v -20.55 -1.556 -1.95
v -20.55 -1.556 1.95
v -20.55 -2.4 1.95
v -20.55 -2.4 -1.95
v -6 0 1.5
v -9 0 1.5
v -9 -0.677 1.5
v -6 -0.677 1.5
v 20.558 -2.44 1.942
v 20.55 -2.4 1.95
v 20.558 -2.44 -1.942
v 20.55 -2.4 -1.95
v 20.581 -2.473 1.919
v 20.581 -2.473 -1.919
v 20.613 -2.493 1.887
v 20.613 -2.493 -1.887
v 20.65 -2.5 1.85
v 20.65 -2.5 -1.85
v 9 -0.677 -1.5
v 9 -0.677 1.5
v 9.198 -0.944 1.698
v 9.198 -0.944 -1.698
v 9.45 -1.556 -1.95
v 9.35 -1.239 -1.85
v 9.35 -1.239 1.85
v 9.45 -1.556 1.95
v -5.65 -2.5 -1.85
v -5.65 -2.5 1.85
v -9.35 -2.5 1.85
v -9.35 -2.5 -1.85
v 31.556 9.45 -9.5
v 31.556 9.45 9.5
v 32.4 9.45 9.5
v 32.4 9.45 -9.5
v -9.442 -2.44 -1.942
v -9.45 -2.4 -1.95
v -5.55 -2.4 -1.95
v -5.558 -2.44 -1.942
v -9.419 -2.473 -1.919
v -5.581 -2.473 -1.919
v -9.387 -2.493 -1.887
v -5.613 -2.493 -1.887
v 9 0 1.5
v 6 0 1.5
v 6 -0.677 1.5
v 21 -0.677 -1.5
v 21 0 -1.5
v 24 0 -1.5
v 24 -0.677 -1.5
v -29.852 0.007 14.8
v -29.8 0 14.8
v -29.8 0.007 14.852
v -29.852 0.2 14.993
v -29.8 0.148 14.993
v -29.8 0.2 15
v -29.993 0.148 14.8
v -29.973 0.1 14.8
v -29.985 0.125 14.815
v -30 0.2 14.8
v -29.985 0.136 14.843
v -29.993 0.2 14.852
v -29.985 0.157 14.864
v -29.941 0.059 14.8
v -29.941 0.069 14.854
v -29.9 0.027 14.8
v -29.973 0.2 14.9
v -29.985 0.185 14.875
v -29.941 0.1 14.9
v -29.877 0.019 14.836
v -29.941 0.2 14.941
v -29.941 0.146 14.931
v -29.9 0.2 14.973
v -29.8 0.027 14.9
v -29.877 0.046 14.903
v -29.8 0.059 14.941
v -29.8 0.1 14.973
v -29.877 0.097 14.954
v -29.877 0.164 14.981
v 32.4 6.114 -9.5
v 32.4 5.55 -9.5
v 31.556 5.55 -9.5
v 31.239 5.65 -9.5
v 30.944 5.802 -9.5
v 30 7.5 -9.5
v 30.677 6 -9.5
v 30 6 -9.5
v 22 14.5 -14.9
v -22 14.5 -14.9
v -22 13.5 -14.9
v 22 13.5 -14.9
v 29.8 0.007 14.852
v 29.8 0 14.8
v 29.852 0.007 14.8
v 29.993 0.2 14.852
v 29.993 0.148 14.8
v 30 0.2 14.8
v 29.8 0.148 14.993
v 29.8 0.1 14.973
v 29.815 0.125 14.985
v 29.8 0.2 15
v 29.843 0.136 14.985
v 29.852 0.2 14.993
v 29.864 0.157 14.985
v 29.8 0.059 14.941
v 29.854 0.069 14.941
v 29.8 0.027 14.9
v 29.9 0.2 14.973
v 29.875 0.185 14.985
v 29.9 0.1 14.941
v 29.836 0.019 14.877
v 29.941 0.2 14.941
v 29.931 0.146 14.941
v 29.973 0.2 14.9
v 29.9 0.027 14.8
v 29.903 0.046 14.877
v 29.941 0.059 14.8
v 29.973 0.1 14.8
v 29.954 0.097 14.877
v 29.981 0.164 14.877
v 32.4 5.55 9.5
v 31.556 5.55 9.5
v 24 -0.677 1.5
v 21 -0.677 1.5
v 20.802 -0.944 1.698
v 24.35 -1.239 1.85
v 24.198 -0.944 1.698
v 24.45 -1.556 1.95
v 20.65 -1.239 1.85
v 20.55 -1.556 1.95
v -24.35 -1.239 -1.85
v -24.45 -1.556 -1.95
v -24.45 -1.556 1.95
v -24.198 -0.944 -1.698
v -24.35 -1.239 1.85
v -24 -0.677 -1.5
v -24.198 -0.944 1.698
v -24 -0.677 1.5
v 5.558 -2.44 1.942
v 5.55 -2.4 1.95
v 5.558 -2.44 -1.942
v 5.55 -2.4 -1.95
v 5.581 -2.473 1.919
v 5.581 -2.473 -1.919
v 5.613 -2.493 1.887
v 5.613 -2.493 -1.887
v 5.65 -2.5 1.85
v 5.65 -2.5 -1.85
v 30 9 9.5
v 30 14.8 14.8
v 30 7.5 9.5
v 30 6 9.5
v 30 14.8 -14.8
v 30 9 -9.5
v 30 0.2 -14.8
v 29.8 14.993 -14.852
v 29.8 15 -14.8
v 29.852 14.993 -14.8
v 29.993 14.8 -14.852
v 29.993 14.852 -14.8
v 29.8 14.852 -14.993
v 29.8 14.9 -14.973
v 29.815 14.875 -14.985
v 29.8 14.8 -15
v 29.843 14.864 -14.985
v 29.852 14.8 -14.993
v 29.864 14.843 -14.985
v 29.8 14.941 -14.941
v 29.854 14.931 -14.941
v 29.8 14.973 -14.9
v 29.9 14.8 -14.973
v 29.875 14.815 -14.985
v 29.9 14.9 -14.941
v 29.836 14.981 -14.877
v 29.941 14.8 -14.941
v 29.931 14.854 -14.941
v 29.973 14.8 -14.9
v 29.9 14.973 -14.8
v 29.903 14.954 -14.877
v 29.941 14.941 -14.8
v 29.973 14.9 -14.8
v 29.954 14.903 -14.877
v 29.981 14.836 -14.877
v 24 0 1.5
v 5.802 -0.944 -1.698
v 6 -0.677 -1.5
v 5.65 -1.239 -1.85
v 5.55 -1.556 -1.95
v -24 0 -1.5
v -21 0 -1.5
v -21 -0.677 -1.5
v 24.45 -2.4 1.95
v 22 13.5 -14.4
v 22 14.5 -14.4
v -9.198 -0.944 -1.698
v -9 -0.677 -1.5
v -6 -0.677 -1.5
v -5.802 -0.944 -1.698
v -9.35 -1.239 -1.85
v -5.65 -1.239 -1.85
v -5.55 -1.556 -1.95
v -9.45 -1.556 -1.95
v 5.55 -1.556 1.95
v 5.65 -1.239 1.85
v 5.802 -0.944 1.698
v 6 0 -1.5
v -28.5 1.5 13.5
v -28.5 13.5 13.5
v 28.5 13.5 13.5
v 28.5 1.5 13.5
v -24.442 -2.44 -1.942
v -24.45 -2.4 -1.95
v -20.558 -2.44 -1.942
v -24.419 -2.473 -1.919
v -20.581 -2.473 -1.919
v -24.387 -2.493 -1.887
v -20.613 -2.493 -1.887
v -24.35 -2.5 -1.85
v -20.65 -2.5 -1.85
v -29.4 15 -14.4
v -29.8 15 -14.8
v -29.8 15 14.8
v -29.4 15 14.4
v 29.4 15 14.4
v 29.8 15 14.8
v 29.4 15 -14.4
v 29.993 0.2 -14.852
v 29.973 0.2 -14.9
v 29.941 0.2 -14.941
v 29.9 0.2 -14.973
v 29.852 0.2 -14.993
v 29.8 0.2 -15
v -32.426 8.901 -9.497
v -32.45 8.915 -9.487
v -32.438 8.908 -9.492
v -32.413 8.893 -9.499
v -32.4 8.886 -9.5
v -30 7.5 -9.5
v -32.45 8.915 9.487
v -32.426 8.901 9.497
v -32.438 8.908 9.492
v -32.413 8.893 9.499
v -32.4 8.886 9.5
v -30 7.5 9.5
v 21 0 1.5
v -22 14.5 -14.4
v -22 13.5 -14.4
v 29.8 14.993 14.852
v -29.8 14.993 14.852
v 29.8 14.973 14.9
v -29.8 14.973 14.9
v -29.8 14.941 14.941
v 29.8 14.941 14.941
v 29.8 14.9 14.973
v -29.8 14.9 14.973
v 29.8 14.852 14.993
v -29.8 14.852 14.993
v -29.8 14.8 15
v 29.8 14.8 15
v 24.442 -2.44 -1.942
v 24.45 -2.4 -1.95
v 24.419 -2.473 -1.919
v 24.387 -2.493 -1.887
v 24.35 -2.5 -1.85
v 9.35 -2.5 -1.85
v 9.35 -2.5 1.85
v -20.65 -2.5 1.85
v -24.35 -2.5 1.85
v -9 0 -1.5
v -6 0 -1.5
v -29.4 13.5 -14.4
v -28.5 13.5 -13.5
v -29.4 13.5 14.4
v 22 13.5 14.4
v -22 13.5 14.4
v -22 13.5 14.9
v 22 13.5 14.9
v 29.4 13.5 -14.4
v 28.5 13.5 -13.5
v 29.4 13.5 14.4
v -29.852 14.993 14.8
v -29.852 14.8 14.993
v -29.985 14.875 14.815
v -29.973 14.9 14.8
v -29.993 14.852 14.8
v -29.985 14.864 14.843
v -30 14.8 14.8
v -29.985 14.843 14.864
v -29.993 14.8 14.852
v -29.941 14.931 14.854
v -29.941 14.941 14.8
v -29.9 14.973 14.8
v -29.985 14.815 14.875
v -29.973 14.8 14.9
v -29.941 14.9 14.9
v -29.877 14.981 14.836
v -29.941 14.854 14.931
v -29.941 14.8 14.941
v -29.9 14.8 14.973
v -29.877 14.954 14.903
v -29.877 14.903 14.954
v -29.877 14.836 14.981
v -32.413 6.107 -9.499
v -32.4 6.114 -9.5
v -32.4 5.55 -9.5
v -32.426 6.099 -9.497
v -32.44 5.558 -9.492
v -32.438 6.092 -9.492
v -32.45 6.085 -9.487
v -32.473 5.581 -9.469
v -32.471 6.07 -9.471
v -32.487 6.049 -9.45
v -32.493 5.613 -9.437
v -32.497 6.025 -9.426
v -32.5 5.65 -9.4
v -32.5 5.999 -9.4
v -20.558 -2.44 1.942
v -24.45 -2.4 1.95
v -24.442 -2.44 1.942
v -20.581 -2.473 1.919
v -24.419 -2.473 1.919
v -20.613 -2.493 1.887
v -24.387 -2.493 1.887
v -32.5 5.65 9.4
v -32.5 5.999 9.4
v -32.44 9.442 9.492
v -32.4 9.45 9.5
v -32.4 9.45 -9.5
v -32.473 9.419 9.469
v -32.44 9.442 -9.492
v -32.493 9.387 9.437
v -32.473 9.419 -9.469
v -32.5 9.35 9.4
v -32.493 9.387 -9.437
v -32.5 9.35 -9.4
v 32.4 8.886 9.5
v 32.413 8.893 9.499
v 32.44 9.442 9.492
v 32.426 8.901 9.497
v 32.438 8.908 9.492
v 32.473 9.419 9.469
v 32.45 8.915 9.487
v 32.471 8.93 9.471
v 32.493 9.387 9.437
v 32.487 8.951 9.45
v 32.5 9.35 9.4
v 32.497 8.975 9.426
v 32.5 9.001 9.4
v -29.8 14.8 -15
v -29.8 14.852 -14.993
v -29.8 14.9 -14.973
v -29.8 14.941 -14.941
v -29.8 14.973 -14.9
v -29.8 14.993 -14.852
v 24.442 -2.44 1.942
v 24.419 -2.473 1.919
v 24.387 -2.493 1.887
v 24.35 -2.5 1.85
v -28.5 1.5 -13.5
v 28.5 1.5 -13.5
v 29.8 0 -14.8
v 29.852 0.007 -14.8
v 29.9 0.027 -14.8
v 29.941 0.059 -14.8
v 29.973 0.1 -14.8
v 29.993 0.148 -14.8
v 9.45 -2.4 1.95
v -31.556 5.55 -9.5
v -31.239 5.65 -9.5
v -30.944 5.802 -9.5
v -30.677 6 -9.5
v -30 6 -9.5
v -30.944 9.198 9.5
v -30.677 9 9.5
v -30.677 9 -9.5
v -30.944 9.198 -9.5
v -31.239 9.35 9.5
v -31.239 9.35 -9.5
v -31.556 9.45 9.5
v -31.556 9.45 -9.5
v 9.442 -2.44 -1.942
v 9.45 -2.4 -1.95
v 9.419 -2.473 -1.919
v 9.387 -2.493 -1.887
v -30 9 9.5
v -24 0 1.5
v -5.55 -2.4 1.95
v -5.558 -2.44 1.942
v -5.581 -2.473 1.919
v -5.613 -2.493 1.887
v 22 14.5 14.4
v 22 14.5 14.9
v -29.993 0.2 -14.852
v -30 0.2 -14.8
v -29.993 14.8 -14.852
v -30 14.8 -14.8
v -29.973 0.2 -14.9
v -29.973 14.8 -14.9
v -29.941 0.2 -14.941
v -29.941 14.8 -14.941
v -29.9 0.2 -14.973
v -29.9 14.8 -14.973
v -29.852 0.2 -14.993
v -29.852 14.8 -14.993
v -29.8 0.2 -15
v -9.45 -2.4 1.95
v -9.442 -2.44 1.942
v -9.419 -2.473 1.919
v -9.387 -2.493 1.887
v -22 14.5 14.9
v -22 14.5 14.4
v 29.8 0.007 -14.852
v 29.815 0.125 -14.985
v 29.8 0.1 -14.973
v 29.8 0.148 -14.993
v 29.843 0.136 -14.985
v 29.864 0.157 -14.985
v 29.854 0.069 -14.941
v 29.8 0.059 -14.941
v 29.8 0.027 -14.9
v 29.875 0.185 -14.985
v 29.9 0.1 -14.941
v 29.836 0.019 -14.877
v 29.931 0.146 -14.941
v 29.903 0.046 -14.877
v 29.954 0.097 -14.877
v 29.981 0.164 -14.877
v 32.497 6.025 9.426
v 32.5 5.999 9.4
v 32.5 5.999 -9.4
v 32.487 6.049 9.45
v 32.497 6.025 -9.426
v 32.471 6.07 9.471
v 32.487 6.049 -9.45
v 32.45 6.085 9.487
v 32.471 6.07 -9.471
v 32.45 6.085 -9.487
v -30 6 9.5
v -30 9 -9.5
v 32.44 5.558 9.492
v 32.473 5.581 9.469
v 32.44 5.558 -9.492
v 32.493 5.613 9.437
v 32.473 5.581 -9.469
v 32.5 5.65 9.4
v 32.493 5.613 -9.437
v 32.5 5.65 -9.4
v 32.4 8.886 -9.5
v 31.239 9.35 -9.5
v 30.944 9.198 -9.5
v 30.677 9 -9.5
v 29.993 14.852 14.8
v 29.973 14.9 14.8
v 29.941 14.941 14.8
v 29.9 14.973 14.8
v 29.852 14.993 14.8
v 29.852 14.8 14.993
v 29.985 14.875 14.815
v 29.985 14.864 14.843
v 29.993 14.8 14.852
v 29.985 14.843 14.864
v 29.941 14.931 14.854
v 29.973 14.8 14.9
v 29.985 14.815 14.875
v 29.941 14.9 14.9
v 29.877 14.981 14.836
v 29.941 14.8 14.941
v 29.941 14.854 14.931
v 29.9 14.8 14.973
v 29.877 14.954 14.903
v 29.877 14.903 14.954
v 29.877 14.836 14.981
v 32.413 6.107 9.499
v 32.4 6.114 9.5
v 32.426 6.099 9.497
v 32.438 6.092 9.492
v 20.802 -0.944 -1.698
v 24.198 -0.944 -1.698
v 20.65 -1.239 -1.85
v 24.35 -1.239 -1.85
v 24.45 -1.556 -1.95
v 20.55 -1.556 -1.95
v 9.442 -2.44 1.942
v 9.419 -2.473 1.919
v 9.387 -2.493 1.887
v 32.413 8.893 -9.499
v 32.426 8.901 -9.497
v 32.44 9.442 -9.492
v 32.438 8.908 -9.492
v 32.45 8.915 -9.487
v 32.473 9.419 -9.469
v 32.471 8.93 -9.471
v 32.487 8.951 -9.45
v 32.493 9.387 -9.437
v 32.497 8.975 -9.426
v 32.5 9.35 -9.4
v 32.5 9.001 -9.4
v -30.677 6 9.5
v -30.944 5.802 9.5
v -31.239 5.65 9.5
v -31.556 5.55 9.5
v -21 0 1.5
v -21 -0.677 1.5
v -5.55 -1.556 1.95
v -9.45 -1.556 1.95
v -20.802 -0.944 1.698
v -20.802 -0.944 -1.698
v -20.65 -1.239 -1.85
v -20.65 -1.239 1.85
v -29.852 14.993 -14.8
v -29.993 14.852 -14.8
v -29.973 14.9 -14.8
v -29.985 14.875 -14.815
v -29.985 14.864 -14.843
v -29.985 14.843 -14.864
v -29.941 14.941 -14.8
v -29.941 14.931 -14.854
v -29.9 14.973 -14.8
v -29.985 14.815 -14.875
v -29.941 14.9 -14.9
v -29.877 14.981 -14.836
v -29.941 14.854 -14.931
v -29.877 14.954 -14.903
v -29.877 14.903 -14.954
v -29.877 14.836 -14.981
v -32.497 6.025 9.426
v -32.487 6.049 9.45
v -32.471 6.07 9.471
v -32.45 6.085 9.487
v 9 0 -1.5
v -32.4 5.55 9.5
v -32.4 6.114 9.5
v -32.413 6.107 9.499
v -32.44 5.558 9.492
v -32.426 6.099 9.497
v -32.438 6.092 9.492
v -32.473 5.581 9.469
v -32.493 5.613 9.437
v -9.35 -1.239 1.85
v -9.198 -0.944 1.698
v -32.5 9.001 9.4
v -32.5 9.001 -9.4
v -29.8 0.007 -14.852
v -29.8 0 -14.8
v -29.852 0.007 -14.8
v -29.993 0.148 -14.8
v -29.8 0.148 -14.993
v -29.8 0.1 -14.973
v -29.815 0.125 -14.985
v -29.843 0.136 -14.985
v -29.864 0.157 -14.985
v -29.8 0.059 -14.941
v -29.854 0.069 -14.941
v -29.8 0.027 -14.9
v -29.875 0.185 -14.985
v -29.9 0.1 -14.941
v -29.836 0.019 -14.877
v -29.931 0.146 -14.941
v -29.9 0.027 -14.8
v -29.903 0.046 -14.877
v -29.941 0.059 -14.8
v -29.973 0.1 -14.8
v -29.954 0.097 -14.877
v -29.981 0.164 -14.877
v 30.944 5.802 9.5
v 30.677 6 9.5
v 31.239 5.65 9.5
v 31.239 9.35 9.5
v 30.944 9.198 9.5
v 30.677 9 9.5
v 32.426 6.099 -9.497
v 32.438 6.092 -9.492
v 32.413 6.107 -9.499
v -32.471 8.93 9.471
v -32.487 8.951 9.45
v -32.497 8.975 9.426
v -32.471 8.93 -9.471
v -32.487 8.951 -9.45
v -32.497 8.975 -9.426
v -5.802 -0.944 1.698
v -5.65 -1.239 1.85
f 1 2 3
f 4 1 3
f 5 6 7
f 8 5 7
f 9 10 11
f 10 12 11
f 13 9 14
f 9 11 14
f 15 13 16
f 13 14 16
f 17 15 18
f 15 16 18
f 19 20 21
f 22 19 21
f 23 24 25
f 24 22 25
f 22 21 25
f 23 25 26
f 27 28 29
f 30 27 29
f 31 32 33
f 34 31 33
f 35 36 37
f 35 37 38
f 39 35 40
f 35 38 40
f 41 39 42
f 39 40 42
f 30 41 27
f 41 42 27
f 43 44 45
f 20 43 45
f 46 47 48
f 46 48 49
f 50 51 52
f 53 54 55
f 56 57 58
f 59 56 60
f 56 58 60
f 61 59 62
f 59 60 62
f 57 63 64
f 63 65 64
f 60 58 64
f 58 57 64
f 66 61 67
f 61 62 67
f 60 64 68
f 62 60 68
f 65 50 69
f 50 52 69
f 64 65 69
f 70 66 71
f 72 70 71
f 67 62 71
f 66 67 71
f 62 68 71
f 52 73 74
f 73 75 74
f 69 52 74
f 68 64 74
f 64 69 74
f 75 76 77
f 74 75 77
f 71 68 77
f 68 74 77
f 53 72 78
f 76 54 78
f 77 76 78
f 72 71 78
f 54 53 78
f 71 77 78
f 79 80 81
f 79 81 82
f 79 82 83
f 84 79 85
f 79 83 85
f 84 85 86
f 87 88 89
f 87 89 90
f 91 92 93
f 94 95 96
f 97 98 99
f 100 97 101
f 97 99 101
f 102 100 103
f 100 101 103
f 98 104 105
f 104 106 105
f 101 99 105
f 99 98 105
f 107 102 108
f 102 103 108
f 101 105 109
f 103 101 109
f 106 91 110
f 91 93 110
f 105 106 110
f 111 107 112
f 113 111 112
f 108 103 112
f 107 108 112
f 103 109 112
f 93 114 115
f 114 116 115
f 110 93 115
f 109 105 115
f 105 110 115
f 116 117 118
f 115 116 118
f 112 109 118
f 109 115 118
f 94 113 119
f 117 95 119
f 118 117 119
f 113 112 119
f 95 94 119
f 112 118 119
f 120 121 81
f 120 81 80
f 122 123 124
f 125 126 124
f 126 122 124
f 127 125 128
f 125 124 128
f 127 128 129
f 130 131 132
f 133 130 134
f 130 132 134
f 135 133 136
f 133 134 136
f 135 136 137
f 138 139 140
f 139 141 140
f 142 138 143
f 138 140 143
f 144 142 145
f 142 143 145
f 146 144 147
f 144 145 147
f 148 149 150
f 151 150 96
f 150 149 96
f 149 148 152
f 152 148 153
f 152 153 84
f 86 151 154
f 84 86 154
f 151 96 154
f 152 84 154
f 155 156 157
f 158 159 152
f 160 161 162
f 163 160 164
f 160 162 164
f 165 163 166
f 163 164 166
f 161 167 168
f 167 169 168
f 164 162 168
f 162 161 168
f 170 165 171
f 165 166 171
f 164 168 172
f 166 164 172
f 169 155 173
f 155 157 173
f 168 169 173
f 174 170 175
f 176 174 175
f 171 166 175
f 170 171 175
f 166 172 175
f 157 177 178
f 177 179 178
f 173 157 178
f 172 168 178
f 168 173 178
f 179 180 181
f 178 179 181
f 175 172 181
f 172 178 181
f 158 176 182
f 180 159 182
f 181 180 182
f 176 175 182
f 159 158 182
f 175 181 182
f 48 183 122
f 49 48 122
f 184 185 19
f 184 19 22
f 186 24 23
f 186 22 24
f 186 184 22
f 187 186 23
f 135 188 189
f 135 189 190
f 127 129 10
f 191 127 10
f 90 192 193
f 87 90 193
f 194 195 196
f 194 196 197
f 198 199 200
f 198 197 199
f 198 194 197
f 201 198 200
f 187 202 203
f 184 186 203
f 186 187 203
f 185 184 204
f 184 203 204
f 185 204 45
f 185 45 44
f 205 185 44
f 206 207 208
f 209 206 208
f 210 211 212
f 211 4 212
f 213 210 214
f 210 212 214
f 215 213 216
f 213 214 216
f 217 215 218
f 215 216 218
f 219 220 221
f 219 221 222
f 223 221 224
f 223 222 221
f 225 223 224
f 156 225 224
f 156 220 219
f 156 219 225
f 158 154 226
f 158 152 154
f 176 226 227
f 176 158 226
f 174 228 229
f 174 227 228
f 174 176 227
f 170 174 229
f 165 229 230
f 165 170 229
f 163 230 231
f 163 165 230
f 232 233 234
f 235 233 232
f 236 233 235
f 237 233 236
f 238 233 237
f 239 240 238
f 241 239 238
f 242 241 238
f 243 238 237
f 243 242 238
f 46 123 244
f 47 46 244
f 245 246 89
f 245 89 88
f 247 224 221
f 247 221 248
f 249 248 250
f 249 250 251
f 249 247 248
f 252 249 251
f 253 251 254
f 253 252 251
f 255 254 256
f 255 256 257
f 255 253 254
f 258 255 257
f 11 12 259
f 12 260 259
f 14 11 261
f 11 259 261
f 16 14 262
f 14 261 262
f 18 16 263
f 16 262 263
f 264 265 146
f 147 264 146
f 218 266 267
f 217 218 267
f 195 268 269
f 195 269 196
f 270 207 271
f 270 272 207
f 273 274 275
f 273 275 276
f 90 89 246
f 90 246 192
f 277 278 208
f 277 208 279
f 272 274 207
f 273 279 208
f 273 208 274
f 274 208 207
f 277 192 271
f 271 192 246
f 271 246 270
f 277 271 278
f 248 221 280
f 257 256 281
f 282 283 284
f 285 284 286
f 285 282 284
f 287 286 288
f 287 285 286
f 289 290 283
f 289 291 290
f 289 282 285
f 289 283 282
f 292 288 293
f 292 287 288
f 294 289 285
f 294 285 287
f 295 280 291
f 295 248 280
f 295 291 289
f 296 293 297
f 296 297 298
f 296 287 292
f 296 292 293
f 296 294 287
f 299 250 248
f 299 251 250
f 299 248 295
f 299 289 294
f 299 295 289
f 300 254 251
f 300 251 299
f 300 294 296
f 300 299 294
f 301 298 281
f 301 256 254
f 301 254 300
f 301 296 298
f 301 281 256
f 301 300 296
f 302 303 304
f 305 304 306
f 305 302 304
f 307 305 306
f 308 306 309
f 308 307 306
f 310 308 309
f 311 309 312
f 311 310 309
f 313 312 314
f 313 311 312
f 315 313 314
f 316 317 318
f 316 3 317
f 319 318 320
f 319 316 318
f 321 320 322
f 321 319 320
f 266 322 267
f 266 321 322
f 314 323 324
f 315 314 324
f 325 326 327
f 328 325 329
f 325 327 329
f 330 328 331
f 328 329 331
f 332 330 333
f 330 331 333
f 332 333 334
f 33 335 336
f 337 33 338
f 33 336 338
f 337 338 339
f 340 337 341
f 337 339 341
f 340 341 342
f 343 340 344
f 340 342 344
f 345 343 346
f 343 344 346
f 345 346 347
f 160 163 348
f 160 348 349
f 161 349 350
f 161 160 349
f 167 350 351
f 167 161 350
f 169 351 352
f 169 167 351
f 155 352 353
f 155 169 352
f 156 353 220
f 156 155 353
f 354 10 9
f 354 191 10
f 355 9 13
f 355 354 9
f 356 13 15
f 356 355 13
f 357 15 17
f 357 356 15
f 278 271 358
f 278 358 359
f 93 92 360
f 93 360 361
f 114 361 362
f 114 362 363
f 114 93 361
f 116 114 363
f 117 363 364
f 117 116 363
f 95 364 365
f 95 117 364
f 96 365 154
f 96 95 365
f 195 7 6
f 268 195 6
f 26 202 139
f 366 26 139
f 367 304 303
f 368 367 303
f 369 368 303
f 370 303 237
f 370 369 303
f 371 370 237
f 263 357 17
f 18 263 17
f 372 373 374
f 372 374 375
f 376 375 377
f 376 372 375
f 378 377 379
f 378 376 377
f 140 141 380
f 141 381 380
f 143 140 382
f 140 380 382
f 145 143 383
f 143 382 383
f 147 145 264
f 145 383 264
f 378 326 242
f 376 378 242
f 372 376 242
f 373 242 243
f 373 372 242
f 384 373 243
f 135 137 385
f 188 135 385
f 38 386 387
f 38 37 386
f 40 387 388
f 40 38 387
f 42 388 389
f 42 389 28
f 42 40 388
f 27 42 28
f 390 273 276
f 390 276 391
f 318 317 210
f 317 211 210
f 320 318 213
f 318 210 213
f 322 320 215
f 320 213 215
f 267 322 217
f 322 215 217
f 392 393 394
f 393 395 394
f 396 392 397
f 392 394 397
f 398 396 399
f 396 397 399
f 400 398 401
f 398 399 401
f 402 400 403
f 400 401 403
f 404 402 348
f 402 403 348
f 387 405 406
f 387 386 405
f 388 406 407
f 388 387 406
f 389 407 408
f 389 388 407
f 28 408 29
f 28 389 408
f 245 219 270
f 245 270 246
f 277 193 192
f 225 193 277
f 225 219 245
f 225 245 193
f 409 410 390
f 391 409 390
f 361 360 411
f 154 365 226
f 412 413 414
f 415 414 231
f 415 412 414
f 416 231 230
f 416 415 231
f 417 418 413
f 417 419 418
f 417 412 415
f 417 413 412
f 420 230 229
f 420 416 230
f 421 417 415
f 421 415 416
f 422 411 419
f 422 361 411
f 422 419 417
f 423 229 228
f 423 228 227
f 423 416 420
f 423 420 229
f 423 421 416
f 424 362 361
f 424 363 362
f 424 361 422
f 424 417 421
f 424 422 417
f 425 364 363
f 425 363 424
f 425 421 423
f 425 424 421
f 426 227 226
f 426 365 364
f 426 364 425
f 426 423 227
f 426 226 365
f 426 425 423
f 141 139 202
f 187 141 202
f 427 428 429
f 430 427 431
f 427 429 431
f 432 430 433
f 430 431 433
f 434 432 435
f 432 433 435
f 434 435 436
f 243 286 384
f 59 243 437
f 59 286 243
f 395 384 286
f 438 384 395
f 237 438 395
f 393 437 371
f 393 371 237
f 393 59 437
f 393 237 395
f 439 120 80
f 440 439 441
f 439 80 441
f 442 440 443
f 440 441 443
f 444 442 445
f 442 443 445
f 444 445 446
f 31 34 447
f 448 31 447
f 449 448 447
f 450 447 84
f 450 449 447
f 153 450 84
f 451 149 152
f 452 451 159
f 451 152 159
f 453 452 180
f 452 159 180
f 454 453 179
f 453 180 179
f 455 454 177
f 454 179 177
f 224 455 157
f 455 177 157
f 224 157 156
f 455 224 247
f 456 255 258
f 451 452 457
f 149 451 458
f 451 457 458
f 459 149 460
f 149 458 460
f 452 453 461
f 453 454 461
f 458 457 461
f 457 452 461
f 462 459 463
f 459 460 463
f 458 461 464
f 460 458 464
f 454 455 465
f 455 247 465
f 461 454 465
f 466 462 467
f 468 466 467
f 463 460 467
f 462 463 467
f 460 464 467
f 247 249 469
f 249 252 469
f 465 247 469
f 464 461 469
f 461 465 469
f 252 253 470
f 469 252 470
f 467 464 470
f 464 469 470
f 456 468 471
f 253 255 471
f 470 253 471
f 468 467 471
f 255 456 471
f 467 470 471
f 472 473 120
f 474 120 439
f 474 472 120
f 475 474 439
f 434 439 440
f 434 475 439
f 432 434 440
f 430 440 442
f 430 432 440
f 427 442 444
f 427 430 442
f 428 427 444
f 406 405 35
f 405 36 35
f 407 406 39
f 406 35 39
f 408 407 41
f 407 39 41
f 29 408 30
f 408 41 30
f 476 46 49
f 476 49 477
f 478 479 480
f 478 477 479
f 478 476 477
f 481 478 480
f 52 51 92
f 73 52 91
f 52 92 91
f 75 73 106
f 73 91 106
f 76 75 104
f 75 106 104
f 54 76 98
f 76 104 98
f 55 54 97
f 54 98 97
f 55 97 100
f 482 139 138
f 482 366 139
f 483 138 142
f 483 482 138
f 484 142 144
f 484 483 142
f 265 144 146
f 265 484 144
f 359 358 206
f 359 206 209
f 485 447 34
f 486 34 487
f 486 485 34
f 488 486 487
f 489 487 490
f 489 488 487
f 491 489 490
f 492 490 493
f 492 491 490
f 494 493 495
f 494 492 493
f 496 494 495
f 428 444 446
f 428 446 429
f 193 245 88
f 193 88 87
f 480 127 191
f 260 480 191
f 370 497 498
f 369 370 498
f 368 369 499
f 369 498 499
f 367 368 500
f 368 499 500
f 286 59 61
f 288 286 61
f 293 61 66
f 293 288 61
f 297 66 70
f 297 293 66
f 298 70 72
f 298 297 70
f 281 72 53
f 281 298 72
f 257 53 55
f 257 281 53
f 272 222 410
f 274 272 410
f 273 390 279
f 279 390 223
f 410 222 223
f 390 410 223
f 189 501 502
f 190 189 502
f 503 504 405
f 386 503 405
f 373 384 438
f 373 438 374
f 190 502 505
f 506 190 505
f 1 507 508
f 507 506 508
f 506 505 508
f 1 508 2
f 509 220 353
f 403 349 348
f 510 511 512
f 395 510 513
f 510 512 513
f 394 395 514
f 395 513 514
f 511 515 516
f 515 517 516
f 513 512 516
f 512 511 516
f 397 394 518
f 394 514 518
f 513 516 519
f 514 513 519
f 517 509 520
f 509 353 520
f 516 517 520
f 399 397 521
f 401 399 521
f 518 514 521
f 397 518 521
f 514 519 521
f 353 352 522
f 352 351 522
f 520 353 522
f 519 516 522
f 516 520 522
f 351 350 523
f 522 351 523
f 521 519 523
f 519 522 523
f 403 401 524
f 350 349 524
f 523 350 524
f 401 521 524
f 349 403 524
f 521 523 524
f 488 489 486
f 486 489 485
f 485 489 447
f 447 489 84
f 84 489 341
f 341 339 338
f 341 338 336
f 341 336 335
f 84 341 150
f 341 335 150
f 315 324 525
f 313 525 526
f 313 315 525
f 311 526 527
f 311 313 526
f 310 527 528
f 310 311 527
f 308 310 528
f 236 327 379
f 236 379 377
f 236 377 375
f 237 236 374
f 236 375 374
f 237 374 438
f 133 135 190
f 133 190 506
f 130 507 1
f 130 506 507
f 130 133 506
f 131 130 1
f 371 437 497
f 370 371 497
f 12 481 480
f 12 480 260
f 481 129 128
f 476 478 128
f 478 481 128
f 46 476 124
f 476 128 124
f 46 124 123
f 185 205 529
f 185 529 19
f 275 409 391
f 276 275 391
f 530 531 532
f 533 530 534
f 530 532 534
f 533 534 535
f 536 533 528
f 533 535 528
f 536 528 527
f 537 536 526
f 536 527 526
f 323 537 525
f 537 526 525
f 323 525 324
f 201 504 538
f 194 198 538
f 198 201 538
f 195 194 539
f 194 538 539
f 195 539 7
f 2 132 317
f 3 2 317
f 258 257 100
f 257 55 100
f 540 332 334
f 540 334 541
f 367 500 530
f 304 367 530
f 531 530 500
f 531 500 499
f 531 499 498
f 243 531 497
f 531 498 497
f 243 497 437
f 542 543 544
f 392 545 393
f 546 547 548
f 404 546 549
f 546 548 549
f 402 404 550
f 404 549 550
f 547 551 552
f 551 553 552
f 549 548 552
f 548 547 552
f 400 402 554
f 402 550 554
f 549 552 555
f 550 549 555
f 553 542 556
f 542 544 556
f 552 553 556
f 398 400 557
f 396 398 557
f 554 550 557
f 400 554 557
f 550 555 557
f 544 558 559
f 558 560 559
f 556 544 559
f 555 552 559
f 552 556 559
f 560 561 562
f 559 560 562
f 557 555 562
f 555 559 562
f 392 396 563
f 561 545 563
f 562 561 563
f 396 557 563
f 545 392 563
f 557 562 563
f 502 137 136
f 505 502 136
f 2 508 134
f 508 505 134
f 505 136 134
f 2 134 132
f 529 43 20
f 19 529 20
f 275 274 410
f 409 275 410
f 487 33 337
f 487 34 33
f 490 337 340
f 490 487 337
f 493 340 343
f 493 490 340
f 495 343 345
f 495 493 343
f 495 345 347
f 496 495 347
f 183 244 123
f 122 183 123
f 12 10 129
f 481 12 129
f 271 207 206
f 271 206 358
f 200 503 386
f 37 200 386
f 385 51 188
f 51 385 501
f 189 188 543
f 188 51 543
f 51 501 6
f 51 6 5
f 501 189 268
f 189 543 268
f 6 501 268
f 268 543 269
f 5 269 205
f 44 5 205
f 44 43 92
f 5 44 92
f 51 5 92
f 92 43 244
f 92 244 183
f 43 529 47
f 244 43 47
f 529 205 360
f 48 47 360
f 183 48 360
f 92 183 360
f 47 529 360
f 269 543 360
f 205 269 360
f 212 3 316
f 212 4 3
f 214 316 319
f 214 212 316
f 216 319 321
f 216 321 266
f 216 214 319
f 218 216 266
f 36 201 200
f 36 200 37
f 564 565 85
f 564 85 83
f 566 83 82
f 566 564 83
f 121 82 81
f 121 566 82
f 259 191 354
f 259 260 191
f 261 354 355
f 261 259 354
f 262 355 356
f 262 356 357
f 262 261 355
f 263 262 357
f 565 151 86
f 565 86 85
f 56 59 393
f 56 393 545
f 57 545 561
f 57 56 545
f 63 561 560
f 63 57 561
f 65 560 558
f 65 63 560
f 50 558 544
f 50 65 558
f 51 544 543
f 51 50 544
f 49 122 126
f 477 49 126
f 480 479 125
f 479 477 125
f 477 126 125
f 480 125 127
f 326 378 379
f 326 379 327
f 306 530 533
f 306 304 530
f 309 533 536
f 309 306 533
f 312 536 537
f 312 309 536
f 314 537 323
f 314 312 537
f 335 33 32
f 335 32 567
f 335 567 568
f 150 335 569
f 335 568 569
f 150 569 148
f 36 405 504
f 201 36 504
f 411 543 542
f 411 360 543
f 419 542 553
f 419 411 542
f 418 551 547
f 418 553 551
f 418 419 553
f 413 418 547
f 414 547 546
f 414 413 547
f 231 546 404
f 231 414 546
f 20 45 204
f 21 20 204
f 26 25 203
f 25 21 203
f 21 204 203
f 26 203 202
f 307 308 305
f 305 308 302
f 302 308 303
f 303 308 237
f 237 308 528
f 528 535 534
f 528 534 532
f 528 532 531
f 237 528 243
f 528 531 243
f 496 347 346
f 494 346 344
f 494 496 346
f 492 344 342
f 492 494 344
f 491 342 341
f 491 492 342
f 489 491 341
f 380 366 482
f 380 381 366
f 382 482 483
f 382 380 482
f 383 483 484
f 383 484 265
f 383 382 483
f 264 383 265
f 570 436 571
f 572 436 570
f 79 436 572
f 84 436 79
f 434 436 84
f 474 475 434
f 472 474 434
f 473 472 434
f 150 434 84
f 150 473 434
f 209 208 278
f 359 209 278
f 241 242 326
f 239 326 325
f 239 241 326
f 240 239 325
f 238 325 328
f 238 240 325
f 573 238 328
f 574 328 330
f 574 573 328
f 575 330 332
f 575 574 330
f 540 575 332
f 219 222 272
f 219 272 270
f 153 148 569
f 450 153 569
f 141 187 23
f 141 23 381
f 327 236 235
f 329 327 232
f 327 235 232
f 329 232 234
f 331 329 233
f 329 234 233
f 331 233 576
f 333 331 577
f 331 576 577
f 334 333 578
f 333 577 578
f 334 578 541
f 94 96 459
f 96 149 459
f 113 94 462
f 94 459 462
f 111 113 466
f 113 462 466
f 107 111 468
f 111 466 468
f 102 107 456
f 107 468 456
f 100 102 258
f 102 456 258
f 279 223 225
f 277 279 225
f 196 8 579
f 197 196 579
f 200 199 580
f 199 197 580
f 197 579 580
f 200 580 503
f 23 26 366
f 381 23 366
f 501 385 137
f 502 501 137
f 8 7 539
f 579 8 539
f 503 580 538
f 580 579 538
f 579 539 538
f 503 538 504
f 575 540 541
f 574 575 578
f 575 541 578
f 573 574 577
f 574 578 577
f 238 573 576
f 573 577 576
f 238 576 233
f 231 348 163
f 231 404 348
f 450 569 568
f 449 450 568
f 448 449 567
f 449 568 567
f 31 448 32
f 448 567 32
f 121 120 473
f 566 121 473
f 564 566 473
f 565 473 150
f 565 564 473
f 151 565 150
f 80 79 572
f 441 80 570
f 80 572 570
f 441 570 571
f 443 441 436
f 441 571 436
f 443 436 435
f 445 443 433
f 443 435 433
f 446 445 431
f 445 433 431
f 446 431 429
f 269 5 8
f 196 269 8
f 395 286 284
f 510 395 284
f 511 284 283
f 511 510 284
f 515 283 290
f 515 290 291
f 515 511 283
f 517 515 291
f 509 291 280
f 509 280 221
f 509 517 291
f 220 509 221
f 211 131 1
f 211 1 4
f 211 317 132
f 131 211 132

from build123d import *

# Parameters (mm, degrees)
SKETCH_1_W             = 60
SKETCH_1_H             = 30
EXTRUDE_1_DEPTH        = 15
SKETCH_2_W             = 58.8
SKETCH_2_H             = 28.8
CUT_EXTRUDE_2_DEPTH    = 1.5
SKETCH_4_W             = 57
SKETCH_4_H             = 27
CUT_EXTRUDE_3_DEPTH    = 12
SKETCH_5_W             = 44
SKETCH_5_H             = 1
CUT_EXTRUDE_4_DEPTH    = 0.5
EXTRUDE_START          = -5.5
EXTRUDE_4_DEPTH        = 19
MIRROR_START           = -5.5
MIRROR_3_COPY_1_DEPTH  = 19
EXTRUDE_5_DEPTH        = 2
PATTERN_LINEAR_1_COUNT = 4
PATTERN_LINEAR_1_PITCH = 15
CUT_EXTRUDE_5_DEPTH    = 67.001893912
FILLET_1_R             = 0.2
FILLET_2_R             = 0.1


with BuildPart() as part:
    # 草图1 → 凸台-拉伸1 (new body)
    with BuildSketch(Plane(origin=(0, 0, 0), x_dir=(1, 0, 0), z_dir=(0, 1, 0))):
        Rectangle(SKETCH_1_W, SKETCH_1_H)
    extrude(amount=EXTRUDE_1_DEPTH)

    # 草图2 → 切除-拉伸2 (cut)
    with BuildSketch(Plane(origin=(0, 15, 0), x_dir=(1, 0, 0), z_dir=(0, 1, 0))):
        Rectangle(SKETCH_2_W, SKETCH_2_H)
    extrude(amount=-CUT_EXTRUDE_2_DEPTH, mode=Mode.SUBTRACT)

    # 草图4 → 切除-拉伸3 (cut)
    with BuildSketch(Plane(origin=(0, 13.5, 0), x_dir=(1, 0, 0), z_dir=(0, 1, 0))):
        Rectangle(SKETCH_4_W, SKETCH_4_H)
    extrude(amount=-CUT_EXTRUDE_3_DEPTH, mode=Mode.SUBTRACT)

    # 草图5 → 切除-拉伸4 (cut)
    with BuildSketch(Plane.XY.offset(-14.4)):
        with Locations((0, 14)):
            Rectangle(SKETCH_5_W, SKETCH_5_H)
    cut_extrude_4 = extrude(amount=-CUT_EXTRUDE_4_DEPTH, mode=Mode.SUBTRACT)

    # 镜向1: 切除-拉伸4 across plane
    add(cut_extrude_4.mirror(Plane.XY), mode=Mode.SUBTRACT)

    # 草图6 → 凸台-拉伸4 (add)
    with BuildSketch(Plane.XY.offset(15).offset(EXTRUDE_START)):
        with BuildLine():
            Line((30, 7.5), (30, 9))
            Line((30, 9), (30.677124344, 9))
            ThreePointArc((30.677124344, 9), (31.088161527, 9.280042303), (31.555590279, 9.45))
            Line((31.555590279, 9.45), (32.5, 9.45))
            Line((32.5, 9.45), (32.5, 8.943375673))
            Line((32.5, 8.943375673), (30, 7.5))
        make_face()
    extrude_4 = extrude(amount=-EXTRUDE_4_DEPTH)

    # 镜向2: 凸台-拉伸4 across plane
    add(extrude_4.mirror(Plane(origin=(0, 7.5, 0), x_dir=(0, 0, 1), z_dir=(0, -1, 0))))

    # 镜向3: 凸台-拉伸4 across plane
    add(extrude_4.mirror(Plane(origin=(0, 0, 0), x_dir=(0, 0, 1), z_dir=(1, 0, 0))))

    # 镜向3 copy 1 sketch → 镜向3 copy 1 (add)
    with BuildSketch(Plane(origin=(0, 15, 15), x_dir=(-1, 0, 0), z_dir=(0, 0, 1)).offset(MIRROR_START)):
        with BuildLine():
            Line((30, 7.5), (30, 9))
            Line((30, 9), (30.677124344, 9))
            ThreePointArc((30.677124344, 9), (31.088161527, 9.280042303), (31.555590279, 9.45))
            Line((31.555590279, 9.45), (32.5, 9.45))
            Line((32.5, 9.45), (32.5, 8.943375673))
            Line((32.5, 8.943375673), (30, 7.5))
        make_face()
    extrude(amount=-MIRROR_3_COPY_1_DEPTH)

    # 草图7 → 凸台-拉伸5 (add, symmetric)
    with BuildSketch(Plane.XY):
        with BuildLine():
            Line((-24, 0), (-21, 0))
            Line((-21, 0), (-21, -0.677124344))
            ThreePointArc((-21, -0.677124344), (-20.719957697, -1.088161527), (-20.55, -1.555590279))
            Line((-20.55, -1.555590279), (-20.55, -2.5))
            Line((-20.55, -2.5), (-24.45, -2.5))
            Line((-24.45, -2.5), (-24.45, -1.555590279))
            ThreePointArc((-24.45, -1.555590279), (-24.280042303, -1.088161527), (-24, -0.677124344))
            Line((-24, -0.677124344), (-24, 0))
        make_face()
    extrude_5 = extrude(amount=EXTRUDE_5_DEPTH, both=True)

    # 阵列(线性)1: 凸台-拉伸5 ×4
    with Locations(*[(i * PATTERN_LINEAR_1_PITCH, 0, 0) for i in range(1, PATTERN_LINEAR_1_COUNT)]):
        add(extrude_5)

    # 草图8 → 切除-拉伸5 (cut, through all)
    with BuildSketch(Plane.ZY.offset(30)):
        with BuildLine():
            Line((1.5, 0), (1.5, -0.677124344))
            ThreePointArc((1.5, -0.677124344), (1.780042303, -1.088161527), (1.95, -1.555590279))
            Line((1.95, -1.555590279), (1.95, -2.5))
            Line((1.95, -2.5), (2, -2.5))
            Line((2, -2.5), (2, 0))
            Line((2, 0), (1.5, 0))
        make_face()
        with BuildLine():
            Line((-2, 0), (-1.5, 0))
            Line((-1.5, 0), (-1.5, -0.677124344))
            ThreePointArc((-1.5, -0.677124344), (-1.780042303, -1.088161527), (-1.95, -1.555590279))
            Line((-1.95, -1.555590279), (-1.95, -2.5))
            Line((-1.95, -2.5), (-2, -2.5))
            Line((-2, -2.5), (-2, 0))
        make_face()
    extrude(amount=-CUT_EXTRUDE_5_DEPTH, mode=Mode.SUBTRACT)

    # 圆角1
    fillet_1_edges = [part.edges().sort_by_distance(p)[0] for p in [
        (0, 15, 15),
        (30, 15, 0),
        (0, 15, -15),
        (30, 0, 0),
        (0, 0, 15),
        (-30, 0, 0),
        (0, 0, -15),
        (-30, 15, 0),
        (30, 7.5, -15),
        (30, 7.5, 15),
        (-30, 7.5, 15),
        (-30, 7.5, -15),
    ]]
    fillet(fillet_1_edges, radius=FILLET_1_R)

    # 圆角2
    fillet_2_edges = [part.edges().sort_by_distance(p)[0] for p in [
        (-32.5, 9.45, 0),
        (-32.5, 9.196687836, -9.5),
        (-32.5, 6.056624327, 0),
        (-32.5, 5.803312164, -9.5),
        (-32.5, 5.55, 0),
        (-32.5, 5.803312164, 9.5),
        (24.45, -2.5, 0),
        (20.55, -2.5, 0),
        (9.45, -2.5, 0),
        (5.55, -2.5, 0),
        (-5.55, -2.5, 0),
        (-9.45, -2.5, 0),
        (-20.55, -2.5, 0),
        (-24.45, -2.5, 0),
        (-22.5, -2.5, -1.95),
        (-7.5, -2.5, -1.95),
        (7.5, -2.5, -1.95),
        (22.5, -2.5, -1.95),
        (-22.5, -2.5, 1.95),
        (-7.5, -2.5, 1.95),
        (7.5, -2.5, 1.95),
        (22.5, -2.5, 1.95),
        (32.5, 8.943375673, 0),
        (32.5, 9.196687836, -9.5),
        (32.5, 9.45, 0),
        (32.5, 9.196687836, 9.5),
        (32.5, 5.803312164, 9.5),
        (32.5, 6.056624327, 0),
        (32.5, 5.55, 0),
        (32.5, 5.803312164, -9.5),
        (-32.5, 9.196687836, 9.5),
        (-32.5, 8.943375673, 0),
    ]]
    fillet(fillet_2_edges, radius=FILLET_2_R)


solid = part.part
